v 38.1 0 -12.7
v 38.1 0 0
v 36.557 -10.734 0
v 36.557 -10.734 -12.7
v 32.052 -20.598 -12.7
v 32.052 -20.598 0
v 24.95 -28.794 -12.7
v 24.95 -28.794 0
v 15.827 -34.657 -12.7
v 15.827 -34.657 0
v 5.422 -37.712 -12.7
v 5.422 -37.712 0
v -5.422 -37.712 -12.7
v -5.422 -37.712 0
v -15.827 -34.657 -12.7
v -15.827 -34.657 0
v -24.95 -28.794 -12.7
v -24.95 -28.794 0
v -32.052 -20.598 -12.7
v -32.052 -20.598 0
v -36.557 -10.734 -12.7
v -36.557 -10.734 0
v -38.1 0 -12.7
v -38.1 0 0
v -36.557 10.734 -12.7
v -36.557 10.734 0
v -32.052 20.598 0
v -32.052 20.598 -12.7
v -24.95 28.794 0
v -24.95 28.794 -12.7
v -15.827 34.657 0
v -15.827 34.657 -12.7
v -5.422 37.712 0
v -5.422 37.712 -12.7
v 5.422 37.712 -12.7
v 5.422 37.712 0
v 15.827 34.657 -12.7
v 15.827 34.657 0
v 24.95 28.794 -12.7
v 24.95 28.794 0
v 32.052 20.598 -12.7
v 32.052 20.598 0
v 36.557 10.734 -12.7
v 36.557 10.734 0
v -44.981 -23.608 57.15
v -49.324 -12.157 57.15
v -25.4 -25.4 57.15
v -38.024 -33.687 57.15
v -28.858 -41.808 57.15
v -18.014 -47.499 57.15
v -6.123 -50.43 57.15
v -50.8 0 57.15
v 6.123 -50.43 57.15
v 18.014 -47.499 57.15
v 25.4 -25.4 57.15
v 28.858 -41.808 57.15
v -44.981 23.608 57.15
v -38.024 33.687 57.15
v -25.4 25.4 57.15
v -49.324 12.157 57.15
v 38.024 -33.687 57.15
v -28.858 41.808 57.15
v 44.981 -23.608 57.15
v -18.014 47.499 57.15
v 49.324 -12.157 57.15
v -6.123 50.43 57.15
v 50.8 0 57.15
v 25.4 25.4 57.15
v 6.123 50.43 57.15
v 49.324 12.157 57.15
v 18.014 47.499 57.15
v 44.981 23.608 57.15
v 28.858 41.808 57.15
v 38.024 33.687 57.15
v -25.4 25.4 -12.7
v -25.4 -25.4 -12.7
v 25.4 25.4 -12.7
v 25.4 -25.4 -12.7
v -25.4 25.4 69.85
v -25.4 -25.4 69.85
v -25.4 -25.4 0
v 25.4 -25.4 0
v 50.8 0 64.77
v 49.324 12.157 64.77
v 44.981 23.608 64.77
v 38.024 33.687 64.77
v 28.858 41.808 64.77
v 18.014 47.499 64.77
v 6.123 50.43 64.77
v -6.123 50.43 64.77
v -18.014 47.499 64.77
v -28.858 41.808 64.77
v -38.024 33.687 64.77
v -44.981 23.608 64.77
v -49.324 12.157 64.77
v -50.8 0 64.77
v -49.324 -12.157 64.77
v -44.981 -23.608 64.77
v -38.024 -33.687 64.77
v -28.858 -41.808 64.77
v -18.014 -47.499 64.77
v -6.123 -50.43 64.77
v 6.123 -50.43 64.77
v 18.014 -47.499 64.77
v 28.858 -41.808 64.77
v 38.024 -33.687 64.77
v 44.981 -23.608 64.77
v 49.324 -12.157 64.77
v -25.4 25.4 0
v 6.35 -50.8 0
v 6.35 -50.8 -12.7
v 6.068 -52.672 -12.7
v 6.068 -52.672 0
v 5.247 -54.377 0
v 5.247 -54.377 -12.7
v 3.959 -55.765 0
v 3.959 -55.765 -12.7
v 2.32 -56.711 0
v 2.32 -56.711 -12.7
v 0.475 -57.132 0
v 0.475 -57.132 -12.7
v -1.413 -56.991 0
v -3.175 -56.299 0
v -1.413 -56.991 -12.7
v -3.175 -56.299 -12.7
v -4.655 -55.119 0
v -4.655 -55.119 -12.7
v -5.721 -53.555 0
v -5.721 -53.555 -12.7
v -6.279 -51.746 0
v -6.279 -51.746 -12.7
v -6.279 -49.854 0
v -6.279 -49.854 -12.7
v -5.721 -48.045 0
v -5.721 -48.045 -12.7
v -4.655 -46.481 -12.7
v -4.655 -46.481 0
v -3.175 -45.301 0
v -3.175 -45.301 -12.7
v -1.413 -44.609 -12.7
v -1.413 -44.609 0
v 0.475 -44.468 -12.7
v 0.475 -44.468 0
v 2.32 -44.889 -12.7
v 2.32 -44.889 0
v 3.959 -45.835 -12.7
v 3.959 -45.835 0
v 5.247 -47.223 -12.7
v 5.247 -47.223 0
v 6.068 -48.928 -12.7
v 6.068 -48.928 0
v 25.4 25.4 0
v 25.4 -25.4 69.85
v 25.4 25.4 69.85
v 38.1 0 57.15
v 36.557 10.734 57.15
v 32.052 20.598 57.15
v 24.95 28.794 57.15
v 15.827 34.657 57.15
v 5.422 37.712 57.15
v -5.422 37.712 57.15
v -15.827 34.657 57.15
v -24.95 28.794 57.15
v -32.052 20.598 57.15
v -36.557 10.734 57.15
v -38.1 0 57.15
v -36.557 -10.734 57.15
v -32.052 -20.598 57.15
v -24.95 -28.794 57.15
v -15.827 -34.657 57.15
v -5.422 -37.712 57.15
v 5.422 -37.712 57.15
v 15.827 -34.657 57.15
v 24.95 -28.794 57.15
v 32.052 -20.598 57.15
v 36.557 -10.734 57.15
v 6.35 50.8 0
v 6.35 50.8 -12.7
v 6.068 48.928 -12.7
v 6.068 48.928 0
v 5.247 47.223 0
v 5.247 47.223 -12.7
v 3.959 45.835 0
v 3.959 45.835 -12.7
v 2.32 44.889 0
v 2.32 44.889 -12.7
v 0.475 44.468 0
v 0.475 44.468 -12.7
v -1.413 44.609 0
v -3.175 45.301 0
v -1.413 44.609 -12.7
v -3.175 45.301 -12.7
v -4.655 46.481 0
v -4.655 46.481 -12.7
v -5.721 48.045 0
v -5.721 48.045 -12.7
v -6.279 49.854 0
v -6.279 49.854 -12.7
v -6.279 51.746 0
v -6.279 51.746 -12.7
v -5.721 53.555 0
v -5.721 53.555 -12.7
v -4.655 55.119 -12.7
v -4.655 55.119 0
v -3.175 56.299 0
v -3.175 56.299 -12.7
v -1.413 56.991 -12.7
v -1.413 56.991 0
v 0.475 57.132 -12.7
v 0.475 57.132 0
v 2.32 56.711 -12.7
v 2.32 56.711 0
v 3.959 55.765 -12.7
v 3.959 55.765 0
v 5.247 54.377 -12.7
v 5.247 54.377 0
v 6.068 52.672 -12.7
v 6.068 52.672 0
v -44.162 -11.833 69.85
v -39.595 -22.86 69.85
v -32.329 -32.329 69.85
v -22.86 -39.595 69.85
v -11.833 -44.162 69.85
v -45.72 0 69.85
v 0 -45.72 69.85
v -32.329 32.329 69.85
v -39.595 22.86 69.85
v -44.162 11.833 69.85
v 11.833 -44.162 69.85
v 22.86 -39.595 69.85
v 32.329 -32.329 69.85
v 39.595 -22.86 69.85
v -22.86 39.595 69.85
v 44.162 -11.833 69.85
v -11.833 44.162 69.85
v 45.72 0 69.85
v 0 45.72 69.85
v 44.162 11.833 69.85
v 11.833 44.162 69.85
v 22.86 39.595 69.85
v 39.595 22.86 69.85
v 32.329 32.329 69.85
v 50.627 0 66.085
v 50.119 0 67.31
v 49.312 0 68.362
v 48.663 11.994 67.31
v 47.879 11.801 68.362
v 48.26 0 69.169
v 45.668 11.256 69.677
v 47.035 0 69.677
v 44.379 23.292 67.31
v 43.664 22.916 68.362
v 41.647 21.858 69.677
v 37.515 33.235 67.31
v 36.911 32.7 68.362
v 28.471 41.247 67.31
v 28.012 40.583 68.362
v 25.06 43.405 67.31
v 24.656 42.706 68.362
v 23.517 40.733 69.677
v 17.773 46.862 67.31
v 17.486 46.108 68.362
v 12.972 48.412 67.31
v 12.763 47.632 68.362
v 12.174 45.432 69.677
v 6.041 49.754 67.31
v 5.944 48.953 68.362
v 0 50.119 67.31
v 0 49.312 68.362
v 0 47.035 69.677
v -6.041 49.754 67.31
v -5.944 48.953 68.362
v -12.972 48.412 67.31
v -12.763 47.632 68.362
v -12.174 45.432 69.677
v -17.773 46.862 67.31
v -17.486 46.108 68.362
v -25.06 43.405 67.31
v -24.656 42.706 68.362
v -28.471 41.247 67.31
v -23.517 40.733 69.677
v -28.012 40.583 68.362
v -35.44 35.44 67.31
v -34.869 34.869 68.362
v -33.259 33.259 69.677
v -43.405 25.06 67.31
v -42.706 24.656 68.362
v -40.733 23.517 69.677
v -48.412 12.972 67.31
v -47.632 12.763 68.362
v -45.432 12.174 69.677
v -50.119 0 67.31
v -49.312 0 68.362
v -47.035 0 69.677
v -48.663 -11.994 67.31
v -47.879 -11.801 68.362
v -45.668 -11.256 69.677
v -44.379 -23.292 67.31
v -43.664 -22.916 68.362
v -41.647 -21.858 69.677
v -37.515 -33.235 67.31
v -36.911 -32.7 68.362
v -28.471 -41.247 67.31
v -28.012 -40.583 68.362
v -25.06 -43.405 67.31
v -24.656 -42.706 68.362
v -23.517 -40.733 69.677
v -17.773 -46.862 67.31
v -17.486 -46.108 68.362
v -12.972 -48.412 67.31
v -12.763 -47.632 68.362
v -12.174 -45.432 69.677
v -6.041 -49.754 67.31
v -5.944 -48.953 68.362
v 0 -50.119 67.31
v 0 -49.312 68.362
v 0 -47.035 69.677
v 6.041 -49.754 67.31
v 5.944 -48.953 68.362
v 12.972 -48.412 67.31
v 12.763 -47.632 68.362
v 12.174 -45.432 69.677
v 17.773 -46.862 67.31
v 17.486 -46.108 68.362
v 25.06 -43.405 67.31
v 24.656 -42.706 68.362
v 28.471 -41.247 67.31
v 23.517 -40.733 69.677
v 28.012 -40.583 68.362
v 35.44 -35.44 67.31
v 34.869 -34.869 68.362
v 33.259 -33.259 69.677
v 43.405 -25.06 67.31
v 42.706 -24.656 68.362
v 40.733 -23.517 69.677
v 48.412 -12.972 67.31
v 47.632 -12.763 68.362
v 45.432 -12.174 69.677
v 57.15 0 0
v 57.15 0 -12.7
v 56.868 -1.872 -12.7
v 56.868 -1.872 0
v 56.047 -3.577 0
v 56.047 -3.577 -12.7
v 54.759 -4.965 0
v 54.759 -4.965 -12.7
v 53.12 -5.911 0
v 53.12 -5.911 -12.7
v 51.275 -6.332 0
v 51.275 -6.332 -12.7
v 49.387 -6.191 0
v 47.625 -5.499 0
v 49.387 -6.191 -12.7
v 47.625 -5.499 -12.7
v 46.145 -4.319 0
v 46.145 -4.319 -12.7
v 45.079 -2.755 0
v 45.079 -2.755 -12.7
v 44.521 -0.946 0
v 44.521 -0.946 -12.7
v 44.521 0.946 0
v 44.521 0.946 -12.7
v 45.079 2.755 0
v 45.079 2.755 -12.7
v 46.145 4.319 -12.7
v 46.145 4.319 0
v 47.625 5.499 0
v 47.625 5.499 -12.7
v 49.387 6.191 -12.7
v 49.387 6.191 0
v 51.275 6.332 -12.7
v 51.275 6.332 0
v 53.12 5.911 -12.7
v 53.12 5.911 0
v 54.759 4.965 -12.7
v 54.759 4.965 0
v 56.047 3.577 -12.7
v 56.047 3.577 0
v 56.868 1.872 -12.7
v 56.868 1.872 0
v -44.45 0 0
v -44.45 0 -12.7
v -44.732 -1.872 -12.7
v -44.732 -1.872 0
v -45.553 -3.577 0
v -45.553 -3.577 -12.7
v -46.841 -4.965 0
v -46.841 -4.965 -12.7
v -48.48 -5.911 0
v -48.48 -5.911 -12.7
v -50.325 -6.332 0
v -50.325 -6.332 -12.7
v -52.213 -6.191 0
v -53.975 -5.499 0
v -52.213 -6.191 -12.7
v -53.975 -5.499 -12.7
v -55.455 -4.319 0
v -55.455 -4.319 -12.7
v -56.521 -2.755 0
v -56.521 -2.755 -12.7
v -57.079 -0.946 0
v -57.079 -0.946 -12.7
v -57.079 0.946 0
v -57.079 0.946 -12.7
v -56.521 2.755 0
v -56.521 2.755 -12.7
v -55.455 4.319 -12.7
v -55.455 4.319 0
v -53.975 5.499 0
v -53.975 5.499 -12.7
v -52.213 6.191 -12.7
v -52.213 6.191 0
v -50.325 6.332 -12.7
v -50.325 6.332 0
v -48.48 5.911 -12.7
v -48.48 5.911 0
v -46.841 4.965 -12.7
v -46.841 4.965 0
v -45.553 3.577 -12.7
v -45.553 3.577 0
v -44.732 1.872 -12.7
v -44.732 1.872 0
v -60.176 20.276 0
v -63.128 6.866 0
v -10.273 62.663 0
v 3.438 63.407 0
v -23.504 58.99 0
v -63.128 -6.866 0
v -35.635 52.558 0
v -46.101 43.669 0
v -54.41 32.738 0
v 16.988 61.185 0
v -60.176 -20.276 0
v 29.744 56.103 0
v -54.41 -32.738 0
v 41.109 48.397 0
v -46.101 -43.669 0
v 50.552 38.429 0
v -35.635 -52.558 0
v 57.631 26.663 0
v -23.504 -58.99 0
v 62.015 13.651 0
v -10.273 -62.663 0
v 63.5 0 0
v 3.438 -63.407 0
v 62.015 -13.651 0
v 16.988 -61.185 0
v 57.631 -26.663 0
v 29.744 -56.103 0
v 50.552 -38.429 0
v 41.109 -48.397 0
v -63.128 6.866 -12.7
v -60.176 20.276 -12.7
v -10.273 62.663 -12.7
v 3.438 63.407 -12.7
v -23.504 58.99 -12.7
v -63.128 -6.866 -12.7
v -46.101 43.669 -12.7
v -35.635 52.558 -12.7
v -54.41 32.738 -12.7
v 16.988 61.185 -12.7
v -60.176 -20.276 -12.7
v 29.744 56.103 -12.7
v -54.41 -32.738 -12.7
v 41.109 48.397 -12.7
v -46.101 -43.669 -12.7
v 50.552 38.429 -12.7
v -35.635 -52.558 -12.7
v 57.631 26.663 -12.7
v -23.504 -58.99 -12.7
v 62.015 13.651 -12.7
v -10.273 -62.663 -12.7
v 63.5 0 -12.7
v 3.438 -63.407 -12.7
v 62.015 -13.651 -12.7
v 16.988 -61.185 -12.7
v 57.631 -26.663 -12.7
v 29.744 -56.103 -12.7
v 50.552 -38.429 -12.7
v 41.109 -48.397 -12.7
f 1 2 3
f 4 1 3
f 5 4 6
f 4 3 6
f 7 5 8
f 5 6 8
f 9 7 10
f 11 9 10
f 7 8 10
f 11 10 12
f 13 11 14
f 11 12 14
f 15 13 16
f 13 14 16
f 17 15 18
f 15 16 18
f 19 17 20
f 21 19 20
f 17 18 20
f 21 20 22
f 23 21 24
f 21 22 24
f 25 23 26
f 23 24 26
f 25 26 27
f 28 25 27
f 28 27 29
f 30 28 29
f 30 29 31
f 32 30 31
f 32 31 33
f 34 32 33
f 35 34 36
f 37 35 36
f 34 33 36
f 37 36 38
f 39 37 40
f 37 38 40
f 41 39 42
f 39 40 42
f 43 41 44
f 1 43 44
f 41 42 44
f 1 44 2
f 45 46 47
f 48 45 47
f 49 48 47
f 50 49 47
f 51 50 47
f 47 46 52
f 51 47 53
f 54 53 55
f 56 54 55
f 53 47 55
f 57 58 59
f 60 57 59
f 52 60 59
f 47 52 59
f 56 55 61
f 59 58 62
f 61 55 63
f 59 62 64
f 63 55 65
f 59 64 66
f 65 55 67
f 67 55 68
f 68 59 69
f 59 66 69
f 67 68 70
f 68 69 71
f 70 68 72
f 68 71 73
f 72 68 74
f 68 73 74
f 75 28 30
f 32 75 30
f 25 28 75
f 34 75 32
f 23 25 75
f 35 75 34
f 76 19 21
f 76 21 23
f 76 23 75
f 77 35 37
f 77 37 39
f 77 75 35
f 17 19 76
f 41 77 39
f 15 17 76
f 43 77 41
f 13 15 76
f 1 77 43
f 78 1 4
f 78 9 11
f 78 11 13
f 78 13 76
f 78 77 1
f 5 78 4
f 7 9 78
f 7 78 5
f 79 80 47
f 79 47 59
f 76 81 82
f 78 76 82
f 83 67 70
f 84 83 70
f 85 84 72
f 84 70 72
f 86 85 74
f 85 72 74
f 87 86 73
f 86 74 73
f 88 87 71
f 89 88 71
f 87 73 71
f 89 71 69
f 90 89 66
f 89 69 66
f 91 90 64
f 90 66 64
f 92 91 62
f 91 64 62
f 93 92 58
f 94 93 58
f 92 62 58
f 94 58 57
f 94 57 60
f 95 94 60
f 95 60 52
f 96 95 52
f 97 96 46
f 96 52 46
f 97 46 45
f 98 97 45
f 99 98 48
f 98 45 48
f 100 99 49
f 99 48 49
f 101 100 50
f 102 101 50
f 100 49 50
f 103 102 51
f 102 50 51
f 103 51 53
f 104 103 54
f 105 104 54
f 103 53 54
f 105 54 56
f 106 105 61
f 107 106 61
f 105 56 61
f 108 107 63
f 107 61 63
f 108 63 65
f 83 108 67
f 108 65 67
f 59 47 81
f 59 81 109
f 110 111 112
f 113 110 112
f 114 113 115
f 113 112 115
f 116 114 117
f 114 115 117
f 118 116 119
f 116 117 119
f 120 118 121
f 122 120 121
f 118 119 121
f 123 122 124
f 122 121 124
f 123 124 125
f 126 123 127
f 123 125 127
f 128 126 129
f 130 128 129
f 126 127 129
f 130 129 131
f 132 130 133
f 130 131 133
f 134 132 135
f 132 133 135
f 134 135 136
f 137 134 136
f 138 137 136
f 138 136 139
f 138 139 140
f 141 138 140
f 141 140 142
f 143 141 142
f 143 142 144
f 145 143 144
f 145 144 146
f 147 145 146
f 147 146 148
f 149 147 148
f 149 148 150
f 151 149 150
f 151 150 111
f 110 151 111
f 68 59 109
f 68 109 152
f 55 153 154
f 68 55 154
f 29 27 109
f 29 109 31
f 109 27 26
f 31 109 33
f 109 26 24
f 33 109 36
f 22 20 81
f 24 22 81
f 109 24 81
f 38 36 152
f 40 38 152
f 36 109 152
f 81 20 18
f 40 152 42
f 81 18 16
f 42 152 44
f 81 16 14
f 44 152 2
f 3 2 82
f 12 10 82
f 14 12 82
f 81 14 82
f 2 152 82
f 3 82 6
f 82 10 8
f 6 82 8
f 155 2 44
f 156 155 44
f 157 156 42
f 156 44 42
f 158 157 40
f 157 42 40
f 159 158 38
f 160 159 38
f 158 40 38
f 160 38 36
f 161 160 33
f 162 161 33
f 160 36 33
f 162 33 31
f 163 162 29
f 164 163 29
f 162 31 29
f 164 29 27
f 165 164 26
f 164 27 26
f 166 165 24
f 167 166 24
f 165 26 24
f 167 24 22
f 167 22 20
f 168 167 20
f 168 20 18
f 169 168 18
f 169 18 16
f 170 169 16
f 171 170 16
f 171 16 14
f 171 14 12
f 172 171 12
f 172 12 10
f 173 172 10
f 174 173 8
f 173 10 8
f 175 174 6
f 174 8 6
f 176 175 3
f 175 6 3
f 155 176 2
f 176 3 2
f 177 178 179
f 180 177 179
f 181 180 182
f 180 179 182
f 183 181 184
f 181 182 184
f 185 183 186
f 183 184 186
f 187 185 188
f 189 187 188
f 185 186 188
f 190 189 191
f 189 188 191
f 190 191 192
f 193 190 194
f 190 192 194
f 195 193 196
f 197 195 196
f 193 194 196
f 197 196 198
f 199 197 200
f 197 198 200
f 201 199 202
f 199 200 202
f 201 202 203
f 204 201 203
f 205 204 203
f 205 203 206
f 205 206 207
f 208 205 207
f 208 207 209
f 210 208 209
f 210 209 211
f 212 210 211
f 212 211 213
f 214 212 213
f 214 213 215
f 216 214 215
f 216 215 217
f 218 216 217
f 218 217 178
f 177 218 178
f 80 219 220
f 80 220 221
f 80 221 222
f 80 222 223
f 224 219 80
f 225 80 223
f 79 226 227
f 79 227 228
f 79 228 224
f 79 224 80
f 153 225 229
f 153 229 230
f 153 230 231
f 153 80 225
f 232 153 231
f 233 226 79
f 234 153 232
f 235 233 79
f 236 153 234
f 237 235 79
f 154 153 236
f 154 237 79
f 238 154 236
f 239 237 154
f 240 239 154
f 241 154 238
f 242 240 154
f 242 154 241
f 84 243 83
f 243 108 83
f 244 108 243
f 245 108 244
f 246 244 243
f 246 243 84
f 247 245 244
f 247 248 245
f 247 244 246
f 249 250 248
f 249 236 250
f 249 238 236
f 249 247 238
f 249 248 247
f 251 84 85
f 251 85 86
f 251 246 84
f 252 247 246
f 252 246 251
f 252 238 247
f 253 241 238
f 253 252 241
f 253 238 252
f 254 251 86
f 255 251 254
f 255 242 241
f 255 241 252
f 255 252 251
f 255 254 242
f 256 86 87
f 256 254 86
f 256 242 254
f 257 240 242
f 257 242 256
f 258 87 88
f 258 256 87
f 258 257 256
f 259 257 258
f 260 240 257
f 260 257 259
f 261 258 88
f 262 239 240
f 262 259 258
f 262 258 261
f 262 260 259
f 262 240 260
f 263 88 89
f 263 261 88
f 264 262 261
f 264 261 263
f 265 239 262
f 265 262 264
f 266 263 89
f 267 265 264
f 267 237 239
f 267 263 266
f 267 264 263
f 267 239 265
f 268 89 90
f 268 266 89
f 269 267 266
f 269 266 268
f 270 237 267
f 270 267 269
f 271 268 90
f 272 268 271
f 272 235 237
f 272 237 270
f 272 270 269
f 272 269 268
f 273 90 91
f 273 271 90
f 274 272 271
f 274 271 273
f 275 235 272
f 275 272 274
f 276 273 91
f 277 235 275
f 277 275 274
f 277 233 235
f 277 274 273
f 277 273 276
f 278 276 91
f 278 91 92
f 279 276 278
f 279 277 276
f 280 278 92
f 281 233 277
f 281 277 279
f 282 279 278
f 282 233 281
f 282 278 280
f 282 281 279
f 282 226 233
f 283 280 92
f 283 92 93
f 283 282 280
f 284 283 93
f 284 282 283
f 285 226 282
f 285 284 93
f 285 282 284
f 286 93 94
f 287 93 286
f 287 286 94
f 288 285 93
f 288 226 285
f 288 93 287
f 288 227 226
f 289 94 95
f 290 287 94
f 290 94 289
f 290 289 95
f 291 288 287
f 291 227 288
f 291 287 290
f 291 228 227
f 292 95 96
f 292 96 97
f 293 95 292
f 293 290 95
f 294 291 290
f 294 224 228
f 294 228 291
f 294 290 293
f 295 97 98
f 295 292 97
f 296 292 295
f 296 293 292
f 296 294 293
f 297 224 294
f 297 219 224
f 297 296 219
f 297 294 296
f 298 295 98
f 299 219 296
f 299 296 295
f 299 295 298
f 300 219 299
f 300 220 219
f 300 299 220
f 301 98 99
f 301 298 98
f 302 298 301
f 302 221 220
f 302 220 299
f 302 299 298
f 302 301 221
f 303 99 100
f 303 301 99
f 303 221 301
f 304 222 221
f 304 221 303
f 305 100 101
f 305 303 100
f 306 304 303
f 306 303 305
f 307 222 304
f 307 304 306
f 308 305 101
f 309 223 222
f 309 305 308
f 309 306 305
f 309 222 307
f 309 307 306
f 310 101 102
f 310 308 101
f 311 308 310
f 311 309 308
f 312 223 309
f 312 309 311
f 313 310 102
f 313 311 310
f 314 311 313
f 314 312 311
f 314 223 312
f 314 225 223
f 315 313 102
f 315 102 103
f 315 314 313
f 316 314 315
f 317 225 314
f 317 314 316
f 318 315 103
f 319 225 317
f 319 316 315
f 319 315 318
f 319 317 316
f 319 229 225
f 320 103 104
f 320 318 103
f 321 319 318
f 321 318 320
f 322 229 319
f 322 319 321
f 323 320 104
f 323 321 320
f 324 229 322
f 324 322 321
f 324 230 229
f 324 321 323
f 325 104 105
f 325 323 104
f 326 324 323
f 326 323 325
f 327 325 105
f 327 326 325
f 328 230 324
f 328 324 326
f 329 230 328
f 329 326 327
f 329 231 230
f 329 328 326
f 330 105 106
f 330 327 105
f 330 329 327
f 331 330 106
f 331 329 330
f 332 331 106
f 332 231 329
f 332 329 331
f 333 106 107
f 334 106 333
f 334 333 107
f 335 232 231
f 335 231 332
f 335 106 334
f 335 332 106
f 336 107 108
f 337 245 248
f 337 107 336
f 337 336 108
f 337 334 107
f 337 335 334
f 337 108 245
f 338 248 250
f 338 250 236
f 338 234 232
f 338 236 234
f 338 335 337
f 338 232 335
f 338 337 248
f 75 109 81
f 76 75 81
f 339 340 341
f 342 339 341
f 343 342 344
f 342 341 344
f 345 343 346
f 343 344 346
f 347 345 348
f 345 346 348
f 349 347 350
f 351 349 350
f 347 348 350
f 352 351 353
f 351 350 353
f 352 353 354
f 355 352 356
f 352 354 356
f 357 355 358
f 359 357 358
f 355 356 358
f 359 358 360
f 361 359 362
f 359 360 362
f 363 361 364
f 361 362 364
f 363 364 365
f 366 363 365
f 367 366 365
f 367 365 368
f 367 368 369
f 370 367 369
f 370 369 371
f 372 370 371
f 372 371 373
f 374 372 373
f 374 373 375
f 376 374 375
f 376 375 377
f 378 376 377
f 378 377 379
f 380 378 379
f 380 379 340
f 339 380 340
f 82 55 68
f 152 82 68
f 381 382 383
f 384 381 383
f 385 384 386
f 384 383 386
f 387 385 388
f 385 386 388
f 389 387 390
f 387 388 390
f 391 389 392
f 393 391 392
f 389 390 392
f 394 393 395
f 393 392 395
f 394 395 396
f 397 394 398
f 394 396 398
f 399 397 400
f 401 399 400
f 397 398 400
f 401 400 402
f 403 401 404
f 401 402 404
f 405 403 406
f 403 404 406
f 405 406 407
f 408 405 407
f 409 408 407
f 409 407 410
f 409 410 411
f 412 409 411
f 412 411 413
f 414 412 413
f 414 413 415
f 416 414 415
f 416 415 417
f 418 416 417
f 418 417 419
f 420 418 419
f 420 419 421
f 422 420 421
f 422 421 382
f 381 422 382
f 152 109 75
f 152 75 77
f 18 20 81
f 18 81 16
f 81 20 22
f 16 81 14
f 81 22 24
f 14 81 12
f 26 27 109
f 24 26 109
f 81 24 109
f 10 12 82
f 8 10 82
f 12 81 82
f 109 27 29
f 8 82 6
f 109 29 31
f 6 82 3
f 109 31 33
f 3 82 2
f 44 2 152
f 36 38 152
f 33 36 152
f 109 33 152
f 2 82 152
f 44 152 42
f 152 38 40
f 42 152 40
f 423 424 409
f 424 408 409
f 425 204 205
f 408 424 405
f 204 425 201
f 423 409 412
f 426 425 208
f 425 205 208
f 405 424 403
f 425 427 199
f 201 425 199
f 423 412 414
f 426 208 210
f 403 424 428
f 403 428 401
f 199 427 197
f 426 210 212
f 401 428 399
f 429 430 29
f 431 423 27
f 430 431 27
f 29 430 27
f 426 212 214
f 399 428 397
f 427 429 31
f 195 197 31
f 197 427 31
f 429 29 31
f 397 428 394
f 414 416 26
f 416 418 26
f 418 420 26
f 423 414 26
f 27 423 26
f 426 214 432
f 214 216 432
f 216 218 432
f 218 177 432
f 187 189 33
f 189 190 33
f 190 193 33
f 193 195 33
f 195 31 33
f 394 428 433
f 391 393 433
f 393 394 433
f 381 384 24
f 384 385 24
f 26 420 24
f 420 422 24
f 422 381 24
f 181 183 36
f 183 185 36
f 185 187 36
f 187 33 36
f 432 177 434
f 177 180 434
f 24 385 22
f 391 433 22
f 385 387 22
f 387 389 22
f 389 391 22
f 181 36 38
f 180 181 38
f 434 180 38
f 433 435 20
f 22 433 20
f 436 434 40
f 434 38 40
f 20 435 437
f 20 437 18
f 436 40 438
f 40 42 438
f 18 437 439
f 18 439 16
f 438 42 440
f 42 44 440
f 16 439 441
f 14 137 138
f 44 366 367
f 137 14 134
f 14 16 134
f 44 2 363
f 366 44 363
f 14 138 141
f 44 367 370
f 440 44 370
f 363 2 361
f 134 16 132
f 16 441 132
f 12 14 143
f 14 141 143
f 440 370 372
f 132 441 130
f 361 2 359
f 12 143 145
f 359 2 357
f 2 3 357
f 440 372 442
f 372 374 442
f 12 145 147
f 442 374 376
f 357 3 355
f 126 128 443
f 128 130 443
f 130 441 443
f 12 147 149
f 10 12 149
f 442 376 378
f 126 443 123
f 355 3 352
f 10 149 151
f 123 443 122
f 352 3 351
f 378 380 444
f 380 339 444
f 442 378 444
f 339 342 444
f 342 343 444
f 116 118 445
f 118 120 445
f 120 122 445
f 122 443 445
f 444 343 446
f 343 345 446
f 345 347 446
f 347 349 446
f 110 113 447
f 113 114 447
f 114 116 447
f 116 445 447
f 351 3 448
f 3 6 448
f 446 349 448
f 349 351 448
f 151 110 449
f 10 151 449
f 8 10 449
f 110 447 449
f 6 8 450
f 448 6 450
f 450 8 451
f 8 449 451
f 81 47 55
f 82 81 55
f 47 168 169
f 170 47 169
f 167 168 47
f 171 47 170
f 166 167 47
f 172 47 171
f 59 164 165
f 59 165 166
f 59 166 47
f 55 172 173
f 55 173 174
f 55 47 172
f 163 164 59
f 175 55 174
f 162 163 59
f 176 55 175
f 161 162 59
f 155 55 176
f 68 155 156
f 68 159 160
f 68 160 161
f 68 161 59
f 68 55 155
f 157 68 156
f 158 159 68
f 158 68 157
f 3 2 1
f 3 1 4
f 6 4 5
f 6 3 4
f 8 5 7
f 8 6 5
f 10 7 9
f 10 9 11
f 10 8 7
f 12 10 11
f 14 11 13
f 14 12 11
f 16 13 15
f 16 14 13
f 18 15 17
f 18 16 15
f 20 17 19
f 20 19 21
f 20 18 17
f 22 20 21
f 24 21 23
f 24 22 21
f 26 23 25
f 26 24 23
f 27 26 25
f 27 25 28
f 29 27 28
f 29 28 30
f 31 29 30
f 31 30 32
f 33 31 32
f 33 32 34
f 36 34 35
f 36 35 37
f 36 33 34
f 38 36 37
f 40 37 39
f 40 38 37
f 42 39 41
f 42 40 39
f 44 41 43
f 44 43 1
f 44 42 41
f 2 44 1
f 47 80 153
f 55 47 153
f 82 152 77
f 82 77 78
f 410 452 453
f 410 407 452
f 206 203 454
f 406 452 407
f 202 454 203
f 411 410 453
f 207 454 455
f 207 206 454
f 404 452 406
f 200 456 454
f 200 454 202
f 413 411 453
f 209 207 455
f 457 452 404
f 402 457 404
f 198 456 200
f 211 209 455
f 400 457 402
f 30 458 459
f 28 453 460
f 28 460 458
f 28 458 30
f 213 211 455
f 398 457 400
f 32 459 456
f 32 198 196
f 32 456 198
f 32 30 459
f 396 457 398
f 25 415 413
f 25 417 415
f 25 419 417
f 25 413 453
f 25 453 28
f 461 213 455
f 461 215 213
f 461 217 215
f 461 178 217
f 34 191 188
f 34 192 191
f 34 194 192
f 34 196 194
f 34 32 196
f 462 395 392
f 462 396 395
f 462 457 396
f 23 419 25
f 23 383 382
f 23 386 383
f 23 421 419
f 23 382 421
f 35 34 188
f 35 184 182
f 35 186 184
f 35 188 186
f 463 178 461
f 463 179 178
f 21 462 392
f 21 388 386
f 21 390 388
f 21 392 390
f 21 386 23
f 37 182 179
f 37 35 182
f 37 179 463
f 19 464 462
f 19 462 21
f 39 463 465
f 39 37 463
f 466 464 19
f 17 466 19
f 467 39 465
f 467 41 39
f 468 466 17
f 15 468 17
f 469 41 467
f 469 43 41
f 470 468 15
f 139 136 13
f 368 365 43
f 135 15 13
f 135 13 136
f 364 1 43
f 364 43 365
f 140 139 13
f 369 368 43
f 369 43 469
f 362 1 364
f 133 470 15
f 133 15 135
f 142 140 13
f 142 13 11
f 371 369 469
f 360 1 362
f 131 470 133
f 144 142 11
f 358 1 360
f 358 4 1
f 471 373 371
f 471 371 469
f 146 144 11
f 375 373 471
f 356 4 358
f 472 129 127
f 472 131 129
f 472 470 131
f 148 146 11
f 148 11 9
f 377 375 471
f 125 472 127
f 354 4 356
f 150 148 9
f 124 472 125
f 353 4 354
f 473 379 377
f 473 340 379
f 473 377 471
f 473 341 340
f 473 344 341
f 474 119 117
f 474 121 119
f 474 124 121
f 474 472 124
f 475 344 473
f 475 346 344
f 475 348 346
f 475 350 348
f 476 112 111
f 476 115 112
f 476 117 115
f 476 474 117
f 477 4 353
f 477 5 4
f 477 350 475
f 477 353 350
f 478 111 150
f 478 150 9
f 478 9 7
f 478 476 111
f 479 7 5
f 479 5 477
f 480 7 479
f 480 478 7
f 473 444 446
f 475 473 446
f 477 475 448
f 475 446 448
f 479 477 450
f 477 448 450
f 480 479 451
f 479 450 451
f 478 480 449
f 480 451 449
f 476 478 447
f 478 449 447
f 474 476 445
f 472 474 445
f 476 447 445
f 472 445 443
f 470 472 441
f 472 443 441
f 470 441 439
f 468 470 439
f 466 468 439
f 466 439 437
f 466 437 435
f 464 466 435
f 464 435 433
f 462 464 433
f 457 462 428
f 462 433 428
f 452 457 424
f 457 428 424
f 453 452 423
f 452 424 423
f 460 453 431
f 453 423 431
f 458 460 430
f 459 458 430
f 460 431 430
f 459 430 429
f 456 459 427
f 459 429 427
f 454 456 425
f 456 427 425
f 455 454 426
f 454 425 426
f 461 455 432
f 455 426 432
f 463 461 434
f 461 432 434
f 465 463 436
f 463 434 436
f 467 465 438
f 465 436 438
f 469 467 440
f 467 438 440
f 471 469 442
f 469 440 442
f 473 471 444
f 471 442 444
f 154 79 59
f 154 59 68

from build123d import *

# Parameters (mm, degrees)
F0_R      = 38.1
F1_DEPTH  = 57.15
F2_R      = 50.8
F2_R_2    = 38.1
F3_DEPTH  = 12.7
F4_W      = 50.8
F4_H      = 50.8
F5_DEPTH  = 114.808
F6_W      = 50.8
F6_H      = 50.8
F7_DEPTH  = 73.406
F8_R      = 5.08
F9_R      = 63.5
F9_R_2    = 38.1
F10_DEPTH = 12.7
F11_R     = 38.1
F11_W     = 50.8
F11_H     = 50.8
F12_DEPTH = 12.7
F13_R     = 6.35
F14_DEPTH = 25.4


with BuildPart() as f1:
    # F0 (on Top) → F1 (new body)
    with BuildSketch(Plane.XY):
        Circle(F0_R)
    extrude(amount=F1_DEPTH)


with BuildPart() as f3:
    # F2 (on face) → F3 (new body)
    with BuildSketch(Plane.XY.offset(57.15)):
        Circle(F2_R)
        Circle(F2_R_2, mode=Mode.SUBTRACT)
        Circle(F2_R_2)
    extrude(amount=F3_DEPTH)


with BuildPart() as f5_tool:
    # F4 (on face) → F5 (new body)
    with BuildSketch(Plane.XY.offset(69.85)):
        Rectangle(F4_W, F4_H)
    extrude(amount=-F5_DEPTH)


with BuildPart() as f1_1:
    add(f1.part)

    # F5: cut by f5_tool
    add(f5_tool.part, mode=Mode.SUBTRACT)

    # F6 (on face) → F7 (cut)
    with BuildSketch(Plane(origin=(0, 0, 0), x_dir=(1, 0, 0), z_dir=(0, 0, -1))):
        Rectangle(F6_W, F6_H)
    extrude(amount=-F7_DEPTH, mode=Mode.SUBTRACT)


with BuildPart() as f3_1:
    add(f3.part)

    # F5: cut by f5_tool
    add(f5_tool.part, mode=Mode.SUBTRACT)

    # F8
    f8_edges = [f3_1.edges().sort_by_distance(p)[0] for p in [
        (-50.8, 0, 69.85),
    ]]
    fillet(f8_edges, radius=F8_R)


with BuildPart() as f10:
    # F9 (on face) → F10 (new body)
    with BuildSketch(Plane(origin=(0, 0, 0), x_dir=(1, 0, 0), z_dir=(0, 0, -1))):
        Circle(F9_R)
        Circle(F9_R_2, mode=Mode.SUBTRACT)
    extrude(amount=F10_DEPTH)

    # F13 (on face) → F14 (cut)
    with BuildSketch(Plane(origin=(0, 0, -12.7), x_dir=(1, 0, 0), z_dir=(0, 0, -1))):
        with Locations((0, 50.8)):
            Circle(F13_R)
        with Locations((-50.8, 0)):
            Circle(F13_R)
        with Locations((0, -50.8)):
            Circle(F13_R)
        with Locations((50.8, 0)):
            Circle(F13_R)
    extrude(amount=-F14_DEPTH, mode=Mode.SUBTRACT)


with BuildPart() as f12:
    # F11 (on face) → F12 (new body)
    with BuildSketch(Plane(origin=(0, 0, 0), x_dir=(1, 0, 0), z_dir=(0, 0, -1))):
        Circle(F11_R)
        Rectangle(F11_W, F11_H, mode=Mode.SUBTRACT)
    extrude(amount=F12_DEPTH)


solid = Compound([f1_1.part, f3_1.part, f10.part, f12.part])
